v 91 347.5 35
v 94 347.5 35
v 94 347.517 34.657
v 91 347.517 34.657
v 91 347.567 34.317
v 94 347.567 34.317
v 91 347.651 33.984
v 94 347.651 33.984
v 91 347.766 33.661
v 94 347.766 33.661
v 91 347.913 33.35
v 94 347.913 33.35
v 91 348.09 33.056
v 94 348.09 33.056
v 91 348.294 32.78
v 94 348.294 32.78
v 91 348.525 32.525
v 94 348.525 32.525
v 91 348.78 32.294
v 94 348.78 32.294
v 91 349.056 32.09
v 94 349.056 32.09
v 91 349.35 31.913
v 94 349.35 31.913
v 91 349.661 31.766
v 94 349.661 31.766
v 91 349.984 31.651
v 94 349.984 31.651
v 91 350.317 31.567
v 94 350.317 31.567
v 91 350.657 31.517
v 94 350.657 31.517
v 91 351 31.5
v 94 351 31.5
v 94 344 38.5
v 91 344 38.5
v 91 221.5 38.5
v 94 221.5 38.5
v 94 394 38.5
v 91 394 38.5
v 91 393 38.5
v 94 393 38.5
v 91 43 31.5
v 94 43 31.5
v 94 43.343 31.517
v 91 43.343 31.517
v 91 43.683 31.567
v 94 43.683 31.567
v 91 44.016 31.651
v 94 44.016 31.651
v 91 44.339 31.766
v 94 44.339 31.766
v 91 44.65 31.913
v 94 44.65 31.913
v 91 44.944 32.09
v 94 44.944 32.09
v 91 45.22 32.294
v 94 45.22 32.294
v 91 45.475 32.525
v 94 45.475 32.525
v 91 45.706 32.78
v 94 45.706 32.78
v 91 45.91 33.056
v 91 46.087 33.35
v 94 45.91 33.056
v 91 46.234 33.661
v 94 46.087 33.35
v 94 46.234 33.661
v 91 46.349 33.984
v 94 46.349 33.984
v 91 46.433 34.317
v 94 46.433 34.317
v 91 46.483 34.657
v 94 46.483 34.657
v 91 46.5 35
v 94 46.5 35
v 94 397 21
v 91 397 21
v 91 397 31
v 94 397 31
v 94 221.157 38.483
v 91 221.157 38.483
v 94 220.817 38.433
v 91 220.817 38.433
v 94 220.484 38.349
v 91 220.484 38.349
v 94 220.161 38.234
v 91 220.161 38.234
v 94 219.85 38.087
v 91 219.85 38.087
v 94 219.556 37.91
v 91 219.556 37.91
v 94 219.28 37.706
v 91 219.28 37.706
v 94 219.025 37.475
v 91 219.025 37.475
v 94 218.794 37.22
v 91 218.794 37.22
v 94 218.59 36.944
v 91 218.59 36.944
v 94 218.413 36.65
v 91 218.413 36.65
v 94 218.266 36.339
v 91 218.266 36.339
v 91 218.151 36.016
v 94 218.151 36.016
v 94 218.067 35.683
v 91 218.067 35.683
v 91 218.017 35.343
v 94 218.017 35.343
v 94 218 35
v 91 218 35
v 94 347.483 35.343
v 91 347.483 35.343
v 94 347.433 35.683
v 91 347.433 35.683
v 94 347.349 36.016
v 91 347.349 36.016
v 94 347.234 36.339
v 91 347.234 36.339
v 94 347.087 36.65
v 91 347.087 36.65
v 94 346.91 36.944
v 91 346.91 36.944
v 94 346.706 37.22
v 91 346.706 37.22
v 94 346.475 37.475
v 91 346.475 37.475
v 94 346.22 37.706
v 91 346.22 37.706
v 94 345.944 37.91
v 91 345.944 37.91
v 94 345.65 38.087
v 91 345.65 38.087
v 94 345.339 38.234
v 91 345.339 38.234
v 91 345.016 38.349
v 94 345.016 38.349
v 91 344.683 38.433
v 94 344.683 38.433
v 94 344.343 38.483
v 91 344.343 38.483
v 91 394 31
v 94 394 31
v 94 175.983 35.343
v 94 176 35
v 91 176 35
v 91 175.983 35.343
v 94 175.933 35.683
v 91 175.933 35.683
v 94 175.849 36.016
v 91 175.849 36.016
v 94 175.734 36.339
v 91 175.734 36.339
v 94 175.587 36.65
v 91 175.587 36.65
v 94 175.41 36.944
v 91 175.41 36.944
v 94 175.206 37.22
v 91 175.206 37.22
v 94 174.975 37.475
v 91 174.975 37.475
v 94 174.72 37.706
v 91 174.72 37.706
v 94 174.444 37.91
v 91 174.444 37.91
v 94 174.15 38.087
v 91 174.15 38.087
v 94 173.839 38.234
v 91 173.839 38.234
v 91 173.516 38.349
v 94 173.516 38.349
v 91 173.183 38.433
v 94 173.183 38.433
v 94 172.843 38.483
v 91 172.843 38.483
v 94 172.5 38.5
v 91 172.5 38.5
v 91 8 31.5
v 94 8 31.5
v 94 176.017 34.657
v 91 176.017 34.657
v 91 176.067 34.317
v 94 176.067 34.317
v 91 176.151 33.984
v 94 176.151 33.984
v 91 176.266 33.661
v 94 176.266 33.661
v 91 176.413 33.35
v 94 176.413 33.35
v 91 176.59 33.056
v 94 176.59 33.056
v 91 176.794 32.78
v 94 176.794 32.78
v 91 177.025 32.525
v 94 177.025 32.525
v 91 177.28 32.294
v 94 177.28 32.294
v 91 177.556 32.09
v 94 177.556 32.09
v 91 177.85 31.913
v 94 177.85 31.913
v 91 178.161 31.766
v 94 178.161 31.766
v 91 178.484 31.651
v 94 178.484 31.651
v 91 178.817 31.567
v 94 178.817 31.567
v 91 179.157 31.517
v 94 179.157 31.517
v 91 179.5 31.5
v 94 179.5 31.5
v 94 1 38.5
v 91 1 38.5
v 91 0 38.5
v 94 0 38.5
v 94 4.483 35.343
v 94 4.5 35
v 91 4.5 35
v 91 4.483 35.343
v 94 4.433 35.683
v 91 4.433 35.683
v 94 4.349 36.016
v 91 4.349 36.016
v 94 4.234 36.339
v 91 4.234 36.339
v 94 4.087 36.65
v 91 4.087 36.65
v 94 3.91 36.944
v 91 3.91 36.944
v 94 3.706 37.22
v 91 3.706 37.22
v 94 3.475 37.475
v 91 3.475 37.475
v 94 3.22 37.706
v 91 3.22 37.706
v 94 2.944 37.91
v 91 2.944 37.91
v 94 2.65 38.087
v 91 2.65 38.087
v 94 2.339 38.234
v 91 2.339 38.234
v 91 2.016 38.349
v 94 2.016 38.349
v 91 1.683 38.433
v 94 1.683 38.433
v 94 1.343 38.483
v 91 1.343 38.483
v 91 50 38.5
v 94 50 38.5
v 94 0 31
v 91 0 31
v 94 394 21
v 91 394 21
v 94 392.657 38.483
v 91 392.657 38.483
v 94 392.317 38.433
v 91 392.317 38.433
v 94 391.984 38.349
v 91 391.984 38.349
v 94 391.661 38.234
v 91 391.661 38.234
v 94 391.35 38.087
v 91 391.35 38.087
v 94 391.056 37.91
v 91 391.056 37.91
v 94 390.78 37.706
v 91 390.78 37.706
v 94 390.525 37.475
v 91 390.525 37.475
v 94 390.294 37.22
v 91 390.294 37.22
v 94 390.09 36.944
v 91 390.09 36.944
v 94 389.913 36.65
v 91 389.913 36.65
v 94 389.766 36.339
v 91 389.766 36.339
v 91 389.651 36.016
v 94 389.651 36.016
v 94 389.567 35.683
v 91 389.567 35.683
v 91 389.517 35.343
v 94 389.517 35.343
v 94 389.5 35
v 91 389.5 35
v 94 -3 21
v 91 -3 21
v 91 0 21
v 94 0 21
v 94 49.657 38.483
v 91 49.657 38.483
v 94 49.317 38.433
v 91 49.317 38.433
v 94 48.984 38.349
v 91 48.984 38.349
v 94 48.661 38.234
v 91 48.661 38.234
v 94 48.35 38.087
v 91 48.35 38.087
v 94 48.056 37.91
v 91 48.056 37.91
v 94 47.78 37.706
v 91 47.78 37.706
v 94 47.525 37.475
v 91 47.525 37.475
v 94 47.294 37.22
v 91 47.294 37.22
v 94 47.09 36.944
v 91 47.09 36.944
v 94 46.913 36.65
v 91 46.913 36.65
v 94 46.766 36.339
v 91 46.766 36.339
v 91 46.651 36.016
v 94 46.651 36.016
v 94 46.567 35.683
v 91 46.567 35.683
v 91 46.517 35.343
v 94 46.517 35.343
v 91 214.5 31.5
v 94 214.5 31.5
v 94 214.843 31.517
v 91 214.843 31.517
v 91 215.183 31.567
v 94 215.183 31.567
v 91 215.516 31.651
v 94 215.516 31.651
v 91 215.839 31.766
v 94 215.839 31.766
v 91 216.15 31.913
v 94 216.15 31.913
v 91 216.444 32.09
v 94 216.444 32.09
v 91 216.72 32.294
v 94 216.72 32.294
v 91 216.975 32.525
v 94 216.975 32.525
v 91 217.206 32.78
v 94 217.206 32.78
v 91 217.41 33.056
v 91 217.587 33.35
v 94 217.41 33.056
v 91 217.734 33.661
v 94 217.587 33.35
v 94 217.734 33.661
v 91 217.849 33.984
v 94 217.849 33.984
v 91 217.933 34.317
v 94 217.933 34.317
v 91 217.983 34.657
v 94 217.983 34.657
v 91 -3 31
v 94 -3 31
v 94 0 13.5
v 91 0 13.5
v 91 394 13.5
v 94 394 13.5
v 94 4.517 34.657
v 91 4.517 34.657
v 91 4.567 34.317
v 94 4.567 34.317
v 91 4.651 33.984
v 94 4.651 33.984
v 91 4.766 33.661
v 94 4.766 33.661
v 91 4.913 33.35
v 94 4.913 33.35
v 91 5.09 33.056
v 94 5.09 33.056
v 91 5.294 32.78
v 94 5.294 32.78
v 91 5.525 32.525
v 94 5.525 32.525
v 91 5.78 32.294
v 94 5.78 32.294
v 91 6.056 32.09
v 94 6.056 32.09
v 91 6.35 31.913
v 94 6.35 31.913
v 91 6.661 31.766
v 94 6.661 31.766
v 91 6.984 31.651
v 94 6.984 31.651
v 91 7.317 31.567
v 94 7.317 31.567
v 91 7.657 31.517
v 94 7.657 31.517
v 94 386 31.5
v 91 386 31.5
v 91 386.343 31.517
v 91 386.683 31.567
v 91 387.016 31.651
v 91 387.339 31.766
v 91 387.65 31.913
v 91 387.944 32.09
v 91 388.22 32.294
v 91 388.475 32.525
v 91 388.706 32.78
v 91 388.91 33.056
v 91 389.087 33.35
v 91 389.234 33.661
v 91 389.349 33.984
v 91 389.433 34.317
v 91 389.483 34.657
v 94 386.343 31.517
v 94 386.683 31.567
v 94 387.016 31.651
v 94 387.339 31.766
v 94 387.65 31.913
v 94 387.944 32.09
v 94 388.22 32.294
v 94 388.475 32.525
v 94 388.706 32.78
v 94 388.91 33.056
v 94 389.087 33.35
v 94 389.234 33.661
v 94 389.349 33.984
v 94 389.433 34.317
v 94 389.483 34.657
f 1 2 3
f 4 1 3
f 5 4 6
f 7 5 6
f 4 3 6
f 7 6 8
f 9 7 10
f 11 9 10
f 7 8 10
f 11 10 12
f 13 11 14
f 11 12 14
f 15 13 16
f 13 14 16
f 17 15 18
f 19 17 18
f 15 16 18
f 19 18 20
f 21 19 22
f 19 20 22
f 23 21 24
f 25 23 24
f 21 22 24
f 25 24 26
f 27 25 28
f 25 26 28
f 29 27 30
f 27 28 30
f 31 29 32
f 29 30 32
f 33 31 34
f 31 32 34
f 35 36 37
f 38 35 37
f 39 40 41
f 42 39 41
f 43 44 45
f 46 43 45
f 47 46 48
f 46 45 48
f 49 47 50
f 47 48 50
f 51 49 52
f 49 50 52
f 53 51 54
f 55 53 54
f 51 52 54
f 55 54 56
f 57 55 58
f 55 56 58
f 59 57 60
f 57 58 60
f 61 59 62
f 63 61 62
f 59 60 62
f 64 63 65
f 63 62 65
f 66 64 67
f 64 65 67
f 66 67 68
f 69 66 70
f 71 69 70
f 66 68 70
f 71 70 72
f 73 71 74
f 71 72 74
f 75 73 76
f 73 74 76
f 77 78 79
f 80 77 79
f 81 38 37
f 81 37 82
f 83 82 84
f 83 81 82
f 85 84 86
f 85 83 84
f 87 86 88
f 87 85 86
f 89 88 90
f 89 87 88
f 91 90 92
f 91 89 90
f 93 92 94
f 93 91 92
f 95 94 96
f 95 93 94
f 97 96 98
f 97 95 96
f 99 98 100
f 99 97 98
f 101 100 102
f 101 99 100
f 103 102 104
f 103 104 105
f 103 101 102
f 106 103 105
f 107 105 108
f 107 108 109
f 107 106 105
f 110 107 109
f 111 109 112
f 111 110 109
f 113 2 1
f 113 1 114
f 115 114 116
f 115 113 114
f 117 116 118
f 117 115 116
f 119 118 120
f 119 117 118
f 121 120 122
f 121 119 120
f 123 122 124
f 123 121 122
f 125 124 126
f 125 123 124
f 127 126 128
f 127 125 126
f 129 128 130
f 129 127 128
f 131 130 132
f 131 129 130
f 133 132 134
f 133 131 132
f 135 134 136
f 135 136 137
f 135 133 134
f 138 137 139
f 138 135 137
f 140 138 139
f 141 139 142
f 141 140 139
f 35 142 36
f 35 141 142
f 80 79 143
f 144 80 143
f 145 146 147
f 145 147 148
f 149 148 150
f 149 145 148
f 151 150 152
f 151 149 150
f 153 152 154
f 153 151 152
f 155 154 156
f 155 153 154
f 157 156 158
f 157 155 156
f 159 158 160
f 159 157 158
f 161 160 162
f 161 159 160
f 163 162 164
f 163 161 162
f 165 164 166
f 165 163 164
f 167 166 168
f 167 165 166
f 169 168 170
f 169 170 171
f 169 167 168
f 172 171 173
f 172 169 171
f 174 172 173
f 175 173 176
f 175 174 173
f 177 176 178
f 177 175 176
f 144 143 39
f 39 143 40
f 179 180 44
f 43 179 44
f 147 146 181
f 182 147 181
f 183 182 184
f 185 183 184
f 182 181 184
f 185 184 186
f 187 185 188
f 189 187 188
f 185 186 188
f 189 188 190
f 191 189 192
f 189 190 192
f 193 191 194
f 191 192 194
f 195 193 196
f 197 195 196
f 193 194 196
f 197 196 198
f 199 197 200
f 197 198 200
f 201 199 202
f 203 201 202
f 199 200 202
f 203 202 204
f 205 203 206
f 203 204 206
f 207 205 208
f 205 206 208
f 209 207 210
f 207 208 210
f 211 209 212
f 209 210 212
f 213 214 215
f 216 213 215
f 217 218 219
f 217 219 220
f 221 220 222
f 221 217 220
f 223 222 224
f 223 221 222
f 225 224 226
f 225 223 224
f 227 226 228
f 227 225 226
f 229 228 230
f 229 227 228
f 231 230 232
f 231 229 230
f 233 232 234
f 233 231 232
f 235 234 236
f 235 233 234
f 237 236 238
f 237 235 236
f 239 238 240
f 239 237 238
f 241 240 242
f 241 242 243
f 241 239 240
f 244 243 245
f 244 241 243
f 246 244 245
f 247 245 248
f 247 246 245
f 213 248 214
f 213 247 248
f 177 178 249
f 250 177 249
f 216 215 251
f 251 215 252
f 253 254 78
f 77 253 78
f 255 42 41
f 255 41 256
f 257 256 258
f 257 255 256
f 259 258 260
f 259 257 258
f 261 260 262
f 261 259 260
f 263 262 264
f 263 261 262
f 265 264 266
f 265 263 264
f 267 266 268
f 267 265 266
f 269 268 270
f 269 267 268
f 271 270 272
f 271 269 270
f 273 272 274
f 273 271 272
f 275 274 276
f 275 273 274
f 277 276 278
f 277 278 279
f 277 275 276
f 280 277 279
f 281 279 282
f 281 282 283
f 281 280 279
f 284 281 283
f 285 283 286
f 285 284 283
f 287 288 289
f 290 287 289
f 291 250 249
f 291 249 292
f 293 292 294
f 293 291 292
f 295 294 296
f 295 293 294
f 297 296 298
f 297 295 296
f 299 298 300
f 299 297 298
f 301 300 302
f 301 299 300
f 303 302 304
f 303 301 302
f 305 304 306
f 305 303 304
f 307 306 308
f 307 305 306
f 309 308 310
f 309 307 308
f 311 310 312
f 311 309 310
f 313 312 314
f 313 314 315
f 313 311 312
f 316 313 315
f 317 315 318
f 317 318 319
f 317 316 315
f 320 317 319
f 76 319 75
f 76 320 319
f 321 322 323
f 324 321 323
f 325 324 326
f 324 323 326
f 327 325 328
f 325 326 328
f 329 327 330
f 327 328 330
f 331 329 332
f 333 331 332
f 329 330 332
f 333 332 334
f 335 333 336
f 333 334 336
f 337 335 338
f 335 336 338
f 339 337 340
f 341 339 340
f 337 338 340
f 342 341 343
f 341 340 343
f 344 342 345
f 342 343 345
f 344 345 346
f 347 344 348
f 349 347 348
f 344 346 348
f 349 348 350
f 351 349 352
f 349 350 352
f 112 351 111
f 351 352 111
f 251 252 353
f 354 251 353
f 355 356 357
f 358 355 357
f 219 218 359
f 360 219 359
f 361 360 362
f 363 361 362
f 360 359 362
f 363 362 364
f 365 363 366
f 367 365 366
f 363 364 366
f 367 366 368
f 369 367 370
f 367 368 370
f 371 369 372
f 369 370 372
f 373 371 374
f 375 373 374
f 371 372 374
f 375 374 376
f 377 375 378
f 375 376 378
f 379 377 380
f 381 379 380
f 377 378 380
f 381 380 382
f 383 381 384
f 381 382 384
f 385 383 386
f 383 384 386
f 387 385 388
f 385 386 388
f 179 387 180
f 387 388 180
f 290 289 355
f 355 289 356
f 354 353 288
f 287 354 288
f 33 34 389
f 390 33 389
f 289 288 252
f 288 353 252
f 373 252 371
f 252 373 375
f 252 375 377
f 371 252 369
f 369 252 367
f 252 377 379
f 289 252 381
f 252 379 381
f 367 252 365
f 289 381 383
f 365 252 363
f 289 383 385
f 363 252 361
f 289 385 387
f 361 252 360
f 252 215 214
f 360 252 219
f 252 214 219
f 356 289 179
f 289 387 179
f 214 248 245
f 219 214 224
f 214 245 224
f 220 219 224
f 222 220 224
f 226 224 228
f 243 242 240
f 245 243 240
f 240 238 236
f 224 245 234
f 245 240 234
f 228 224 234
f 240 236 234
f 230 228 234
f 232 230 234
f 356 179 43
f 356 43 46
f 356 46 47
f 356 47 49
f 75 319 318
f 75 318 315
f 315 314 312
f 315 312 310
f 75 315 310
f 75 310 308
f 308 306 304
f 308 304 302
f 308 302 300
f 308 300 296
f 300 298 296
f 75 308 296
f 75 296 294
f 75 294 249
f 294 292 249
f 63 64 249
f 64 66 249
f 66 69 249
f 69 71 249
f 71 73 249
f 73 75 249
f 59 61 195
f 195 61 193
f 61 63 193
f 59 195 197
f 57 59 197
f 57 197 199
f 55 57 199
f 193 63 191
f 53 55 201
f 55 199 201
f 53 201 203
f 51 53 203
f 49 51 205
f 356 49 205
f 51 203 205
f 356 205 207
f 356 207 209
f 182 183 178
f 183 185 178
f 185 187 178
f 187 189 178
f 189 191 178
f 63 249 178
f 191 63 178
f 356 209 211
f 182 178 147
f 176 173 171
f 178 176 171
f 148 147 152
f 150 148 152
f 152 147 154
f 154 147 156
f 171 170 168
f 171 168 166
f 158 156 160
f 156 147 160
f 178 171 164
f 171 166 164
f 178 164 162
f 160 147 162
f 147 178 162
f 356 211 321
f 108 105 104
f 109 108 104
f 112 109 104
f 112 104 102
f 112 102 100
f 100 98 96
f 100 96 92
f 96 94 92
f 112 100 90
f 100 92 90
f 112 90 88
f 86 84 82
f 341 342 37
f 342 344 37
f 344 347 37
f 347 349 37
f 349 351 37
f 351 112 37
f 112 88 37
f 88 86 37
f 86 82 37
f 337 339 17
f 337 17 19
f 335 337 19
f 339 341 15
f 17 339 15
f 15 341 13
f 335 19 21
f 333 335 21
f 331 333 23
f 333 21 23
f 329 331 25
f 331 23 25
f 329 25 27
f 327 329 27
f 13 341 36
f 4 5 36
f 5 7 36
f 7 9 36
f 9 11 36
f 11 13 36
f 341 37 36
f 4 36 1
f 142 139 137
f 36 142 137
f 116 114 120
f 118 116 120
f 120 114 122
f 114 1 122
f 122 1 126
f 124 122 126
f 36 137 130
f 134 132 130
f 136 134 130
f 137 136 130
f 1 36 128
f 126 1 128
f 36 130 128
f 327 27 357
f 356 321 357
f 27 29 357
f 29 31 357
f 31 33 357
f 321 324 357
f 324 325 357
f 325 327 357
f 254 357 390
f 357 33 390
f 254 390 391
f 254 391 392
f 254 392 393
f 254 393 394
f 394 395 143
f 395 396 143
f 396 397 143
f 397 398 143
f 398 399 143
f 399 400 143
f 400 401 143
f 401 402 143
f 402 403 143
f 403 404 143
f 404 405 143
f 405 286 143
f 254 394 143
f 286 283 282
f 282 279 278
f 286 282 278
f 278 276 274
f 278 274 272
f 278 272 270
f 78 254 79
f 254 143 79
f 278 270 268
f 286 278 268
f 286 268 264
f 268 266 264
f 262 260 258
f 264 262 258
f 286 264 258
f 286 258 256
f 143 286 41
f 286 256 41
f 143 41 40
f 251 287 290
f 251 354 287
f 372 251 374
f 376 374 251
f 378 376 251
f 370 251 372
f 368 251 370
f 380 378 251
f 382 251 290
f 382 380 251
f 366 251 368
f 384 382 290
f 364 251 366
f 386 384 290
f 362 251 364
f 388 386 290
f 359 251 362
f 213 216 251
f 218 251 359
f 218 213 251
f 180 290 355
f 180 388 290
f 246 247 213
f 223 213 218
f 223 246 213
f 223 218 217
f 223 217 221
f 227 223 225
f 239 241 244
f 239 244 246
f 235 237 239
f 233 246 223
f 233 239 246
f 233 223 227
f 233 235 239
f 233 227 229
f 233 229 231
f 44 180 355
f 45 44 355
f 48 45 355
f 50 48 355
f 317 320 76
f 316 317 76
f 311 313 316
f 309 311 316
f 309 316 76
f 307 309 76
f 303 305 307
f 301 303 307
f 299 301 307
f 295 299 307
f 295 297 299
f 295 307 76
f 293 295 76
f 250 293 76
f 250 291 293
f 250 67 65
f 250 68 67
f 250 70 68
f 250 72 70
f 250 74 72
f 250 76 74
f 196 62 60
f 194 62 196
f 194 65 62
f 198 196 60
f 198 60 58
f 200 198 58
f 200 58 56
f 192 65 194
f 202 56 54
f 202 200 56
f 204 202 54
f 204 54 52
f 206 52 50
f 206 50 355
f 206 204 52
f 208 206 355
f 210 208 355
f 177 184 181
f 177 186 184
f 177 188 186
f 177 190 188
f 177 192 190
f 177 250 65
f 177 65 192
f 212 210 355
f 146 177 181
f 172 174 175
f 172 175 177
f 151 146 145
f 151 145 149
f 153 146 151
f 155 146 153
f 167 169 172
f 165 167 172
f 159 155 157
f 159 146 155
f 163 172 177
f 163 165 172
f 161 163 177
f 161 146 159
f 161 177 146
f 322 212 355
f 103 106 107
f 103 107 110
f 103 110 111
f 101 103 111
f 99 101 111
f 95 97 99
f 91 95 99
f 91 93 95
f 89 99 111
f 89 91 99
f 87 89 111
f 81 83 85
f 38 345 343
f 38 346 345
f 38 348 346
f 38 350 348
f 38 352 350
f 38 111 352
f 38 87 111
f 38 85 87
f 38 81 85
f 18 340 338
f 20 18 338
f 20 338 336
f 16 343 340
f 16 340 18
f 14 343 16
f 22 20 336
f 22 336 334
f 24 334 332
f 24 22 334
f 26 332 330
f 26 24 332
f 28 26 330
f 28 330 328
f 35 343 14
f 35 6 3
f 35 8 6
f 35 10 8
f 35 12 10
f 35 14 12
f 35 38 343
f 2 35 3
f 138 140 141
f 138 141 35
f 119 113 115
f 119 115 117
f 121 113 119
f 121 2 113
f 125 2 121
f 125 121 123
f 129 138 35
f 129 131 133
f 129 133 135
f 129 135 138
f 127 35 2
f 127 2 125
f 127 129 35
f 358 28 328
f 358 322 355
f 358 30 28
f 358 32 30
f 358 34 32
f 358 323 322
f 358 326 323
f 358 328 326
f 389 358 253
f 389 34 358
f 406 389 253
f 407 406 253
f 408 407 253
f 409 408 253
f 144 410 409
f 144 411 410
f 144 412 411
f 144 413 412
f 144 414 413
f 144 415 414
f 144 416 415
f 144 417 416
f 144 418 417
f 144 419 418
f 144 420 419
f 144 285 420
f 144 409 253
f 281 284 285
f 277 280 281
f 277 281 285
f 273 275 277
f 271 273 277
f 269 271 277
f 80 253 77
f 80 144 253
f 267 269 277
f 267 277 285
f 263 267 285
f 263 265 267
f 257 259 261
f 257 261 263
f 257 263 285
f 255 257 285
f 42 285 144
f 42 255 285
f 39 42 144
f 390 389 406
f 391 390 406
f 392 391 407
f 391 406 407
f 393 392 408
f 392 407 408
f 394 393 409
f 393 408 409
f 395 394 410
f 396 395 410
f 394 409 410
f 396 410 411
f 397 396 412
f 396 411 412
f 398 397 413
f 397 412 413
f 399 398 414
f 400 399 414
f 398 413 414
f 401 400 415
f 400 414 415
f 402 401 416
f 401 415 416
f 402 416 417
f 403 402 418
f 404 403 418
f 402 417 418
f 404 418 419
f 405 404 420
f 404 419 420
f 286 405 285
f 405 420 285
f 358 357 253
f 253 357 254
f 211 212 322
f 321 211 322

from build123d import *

# Parameters (mm, degrees)
PAD002_DEPTH        = 3
POCKET_DEPTH        = 3
LINEARPATTERN_COUNT = 3
LINEARPATTERN_PITCH = 171.5


with BuildPart() as part:
    # Sketch002 → Pad002 (new body)
    with BuildSketch(Plane.YZ):
        Polygon((0, -17.5), (394, -17.5), (394, -10), (397, -10), (397, 0), (394, 0), (394, 7.5), (0, 7.5), (0, 0), (-3, 0), (-3, -10), (0, -10), align=None)
    extrude(amount=PAD002_DEPTH)

    # Sketch003 → Pocket (cut)
    with BuildSketch(Plane.YZ.offset(3)):
        with BuildLine():
            ThreePointArc((4.499999, 4.000001), (5.525124, 1.525129), (7.999997, 0.500003))
            Line((7.999997, 0.500003), (42.999997, 0.500003))
            ThreePointArc((42.999997, 0.500003), (45.474872, 1.525128), (46.499999, 4.000001))
            ThreePointArc((49.999997, 7.5), (47.525124, 6.474874), (46.499999, 4.000001))
            Line((1, 7.5), (49.999997, 7.5))
            ThreePointArc((4.499999, 4.000001), (3.474873, 6.474874), (1, 7.5))
        make_face()
    pocket = extrude(amount=-POCKET_DEPTH, mode=Mode.SUBTRACT)

    # LinearPattern: Pocket ×3
    with Locations(*[(0, i * LINEARPATTERN_PITCH, 0) for i in range(1, LINEARPATTERN_COUNT)]):
        add(pocket, mode=Mode.SUBTRACT)


with BuildPart() as part_1:
    # Body002 placement: moved
    add(part.part.moved(Location((91, 0, 31))))


solid = part_1.part
